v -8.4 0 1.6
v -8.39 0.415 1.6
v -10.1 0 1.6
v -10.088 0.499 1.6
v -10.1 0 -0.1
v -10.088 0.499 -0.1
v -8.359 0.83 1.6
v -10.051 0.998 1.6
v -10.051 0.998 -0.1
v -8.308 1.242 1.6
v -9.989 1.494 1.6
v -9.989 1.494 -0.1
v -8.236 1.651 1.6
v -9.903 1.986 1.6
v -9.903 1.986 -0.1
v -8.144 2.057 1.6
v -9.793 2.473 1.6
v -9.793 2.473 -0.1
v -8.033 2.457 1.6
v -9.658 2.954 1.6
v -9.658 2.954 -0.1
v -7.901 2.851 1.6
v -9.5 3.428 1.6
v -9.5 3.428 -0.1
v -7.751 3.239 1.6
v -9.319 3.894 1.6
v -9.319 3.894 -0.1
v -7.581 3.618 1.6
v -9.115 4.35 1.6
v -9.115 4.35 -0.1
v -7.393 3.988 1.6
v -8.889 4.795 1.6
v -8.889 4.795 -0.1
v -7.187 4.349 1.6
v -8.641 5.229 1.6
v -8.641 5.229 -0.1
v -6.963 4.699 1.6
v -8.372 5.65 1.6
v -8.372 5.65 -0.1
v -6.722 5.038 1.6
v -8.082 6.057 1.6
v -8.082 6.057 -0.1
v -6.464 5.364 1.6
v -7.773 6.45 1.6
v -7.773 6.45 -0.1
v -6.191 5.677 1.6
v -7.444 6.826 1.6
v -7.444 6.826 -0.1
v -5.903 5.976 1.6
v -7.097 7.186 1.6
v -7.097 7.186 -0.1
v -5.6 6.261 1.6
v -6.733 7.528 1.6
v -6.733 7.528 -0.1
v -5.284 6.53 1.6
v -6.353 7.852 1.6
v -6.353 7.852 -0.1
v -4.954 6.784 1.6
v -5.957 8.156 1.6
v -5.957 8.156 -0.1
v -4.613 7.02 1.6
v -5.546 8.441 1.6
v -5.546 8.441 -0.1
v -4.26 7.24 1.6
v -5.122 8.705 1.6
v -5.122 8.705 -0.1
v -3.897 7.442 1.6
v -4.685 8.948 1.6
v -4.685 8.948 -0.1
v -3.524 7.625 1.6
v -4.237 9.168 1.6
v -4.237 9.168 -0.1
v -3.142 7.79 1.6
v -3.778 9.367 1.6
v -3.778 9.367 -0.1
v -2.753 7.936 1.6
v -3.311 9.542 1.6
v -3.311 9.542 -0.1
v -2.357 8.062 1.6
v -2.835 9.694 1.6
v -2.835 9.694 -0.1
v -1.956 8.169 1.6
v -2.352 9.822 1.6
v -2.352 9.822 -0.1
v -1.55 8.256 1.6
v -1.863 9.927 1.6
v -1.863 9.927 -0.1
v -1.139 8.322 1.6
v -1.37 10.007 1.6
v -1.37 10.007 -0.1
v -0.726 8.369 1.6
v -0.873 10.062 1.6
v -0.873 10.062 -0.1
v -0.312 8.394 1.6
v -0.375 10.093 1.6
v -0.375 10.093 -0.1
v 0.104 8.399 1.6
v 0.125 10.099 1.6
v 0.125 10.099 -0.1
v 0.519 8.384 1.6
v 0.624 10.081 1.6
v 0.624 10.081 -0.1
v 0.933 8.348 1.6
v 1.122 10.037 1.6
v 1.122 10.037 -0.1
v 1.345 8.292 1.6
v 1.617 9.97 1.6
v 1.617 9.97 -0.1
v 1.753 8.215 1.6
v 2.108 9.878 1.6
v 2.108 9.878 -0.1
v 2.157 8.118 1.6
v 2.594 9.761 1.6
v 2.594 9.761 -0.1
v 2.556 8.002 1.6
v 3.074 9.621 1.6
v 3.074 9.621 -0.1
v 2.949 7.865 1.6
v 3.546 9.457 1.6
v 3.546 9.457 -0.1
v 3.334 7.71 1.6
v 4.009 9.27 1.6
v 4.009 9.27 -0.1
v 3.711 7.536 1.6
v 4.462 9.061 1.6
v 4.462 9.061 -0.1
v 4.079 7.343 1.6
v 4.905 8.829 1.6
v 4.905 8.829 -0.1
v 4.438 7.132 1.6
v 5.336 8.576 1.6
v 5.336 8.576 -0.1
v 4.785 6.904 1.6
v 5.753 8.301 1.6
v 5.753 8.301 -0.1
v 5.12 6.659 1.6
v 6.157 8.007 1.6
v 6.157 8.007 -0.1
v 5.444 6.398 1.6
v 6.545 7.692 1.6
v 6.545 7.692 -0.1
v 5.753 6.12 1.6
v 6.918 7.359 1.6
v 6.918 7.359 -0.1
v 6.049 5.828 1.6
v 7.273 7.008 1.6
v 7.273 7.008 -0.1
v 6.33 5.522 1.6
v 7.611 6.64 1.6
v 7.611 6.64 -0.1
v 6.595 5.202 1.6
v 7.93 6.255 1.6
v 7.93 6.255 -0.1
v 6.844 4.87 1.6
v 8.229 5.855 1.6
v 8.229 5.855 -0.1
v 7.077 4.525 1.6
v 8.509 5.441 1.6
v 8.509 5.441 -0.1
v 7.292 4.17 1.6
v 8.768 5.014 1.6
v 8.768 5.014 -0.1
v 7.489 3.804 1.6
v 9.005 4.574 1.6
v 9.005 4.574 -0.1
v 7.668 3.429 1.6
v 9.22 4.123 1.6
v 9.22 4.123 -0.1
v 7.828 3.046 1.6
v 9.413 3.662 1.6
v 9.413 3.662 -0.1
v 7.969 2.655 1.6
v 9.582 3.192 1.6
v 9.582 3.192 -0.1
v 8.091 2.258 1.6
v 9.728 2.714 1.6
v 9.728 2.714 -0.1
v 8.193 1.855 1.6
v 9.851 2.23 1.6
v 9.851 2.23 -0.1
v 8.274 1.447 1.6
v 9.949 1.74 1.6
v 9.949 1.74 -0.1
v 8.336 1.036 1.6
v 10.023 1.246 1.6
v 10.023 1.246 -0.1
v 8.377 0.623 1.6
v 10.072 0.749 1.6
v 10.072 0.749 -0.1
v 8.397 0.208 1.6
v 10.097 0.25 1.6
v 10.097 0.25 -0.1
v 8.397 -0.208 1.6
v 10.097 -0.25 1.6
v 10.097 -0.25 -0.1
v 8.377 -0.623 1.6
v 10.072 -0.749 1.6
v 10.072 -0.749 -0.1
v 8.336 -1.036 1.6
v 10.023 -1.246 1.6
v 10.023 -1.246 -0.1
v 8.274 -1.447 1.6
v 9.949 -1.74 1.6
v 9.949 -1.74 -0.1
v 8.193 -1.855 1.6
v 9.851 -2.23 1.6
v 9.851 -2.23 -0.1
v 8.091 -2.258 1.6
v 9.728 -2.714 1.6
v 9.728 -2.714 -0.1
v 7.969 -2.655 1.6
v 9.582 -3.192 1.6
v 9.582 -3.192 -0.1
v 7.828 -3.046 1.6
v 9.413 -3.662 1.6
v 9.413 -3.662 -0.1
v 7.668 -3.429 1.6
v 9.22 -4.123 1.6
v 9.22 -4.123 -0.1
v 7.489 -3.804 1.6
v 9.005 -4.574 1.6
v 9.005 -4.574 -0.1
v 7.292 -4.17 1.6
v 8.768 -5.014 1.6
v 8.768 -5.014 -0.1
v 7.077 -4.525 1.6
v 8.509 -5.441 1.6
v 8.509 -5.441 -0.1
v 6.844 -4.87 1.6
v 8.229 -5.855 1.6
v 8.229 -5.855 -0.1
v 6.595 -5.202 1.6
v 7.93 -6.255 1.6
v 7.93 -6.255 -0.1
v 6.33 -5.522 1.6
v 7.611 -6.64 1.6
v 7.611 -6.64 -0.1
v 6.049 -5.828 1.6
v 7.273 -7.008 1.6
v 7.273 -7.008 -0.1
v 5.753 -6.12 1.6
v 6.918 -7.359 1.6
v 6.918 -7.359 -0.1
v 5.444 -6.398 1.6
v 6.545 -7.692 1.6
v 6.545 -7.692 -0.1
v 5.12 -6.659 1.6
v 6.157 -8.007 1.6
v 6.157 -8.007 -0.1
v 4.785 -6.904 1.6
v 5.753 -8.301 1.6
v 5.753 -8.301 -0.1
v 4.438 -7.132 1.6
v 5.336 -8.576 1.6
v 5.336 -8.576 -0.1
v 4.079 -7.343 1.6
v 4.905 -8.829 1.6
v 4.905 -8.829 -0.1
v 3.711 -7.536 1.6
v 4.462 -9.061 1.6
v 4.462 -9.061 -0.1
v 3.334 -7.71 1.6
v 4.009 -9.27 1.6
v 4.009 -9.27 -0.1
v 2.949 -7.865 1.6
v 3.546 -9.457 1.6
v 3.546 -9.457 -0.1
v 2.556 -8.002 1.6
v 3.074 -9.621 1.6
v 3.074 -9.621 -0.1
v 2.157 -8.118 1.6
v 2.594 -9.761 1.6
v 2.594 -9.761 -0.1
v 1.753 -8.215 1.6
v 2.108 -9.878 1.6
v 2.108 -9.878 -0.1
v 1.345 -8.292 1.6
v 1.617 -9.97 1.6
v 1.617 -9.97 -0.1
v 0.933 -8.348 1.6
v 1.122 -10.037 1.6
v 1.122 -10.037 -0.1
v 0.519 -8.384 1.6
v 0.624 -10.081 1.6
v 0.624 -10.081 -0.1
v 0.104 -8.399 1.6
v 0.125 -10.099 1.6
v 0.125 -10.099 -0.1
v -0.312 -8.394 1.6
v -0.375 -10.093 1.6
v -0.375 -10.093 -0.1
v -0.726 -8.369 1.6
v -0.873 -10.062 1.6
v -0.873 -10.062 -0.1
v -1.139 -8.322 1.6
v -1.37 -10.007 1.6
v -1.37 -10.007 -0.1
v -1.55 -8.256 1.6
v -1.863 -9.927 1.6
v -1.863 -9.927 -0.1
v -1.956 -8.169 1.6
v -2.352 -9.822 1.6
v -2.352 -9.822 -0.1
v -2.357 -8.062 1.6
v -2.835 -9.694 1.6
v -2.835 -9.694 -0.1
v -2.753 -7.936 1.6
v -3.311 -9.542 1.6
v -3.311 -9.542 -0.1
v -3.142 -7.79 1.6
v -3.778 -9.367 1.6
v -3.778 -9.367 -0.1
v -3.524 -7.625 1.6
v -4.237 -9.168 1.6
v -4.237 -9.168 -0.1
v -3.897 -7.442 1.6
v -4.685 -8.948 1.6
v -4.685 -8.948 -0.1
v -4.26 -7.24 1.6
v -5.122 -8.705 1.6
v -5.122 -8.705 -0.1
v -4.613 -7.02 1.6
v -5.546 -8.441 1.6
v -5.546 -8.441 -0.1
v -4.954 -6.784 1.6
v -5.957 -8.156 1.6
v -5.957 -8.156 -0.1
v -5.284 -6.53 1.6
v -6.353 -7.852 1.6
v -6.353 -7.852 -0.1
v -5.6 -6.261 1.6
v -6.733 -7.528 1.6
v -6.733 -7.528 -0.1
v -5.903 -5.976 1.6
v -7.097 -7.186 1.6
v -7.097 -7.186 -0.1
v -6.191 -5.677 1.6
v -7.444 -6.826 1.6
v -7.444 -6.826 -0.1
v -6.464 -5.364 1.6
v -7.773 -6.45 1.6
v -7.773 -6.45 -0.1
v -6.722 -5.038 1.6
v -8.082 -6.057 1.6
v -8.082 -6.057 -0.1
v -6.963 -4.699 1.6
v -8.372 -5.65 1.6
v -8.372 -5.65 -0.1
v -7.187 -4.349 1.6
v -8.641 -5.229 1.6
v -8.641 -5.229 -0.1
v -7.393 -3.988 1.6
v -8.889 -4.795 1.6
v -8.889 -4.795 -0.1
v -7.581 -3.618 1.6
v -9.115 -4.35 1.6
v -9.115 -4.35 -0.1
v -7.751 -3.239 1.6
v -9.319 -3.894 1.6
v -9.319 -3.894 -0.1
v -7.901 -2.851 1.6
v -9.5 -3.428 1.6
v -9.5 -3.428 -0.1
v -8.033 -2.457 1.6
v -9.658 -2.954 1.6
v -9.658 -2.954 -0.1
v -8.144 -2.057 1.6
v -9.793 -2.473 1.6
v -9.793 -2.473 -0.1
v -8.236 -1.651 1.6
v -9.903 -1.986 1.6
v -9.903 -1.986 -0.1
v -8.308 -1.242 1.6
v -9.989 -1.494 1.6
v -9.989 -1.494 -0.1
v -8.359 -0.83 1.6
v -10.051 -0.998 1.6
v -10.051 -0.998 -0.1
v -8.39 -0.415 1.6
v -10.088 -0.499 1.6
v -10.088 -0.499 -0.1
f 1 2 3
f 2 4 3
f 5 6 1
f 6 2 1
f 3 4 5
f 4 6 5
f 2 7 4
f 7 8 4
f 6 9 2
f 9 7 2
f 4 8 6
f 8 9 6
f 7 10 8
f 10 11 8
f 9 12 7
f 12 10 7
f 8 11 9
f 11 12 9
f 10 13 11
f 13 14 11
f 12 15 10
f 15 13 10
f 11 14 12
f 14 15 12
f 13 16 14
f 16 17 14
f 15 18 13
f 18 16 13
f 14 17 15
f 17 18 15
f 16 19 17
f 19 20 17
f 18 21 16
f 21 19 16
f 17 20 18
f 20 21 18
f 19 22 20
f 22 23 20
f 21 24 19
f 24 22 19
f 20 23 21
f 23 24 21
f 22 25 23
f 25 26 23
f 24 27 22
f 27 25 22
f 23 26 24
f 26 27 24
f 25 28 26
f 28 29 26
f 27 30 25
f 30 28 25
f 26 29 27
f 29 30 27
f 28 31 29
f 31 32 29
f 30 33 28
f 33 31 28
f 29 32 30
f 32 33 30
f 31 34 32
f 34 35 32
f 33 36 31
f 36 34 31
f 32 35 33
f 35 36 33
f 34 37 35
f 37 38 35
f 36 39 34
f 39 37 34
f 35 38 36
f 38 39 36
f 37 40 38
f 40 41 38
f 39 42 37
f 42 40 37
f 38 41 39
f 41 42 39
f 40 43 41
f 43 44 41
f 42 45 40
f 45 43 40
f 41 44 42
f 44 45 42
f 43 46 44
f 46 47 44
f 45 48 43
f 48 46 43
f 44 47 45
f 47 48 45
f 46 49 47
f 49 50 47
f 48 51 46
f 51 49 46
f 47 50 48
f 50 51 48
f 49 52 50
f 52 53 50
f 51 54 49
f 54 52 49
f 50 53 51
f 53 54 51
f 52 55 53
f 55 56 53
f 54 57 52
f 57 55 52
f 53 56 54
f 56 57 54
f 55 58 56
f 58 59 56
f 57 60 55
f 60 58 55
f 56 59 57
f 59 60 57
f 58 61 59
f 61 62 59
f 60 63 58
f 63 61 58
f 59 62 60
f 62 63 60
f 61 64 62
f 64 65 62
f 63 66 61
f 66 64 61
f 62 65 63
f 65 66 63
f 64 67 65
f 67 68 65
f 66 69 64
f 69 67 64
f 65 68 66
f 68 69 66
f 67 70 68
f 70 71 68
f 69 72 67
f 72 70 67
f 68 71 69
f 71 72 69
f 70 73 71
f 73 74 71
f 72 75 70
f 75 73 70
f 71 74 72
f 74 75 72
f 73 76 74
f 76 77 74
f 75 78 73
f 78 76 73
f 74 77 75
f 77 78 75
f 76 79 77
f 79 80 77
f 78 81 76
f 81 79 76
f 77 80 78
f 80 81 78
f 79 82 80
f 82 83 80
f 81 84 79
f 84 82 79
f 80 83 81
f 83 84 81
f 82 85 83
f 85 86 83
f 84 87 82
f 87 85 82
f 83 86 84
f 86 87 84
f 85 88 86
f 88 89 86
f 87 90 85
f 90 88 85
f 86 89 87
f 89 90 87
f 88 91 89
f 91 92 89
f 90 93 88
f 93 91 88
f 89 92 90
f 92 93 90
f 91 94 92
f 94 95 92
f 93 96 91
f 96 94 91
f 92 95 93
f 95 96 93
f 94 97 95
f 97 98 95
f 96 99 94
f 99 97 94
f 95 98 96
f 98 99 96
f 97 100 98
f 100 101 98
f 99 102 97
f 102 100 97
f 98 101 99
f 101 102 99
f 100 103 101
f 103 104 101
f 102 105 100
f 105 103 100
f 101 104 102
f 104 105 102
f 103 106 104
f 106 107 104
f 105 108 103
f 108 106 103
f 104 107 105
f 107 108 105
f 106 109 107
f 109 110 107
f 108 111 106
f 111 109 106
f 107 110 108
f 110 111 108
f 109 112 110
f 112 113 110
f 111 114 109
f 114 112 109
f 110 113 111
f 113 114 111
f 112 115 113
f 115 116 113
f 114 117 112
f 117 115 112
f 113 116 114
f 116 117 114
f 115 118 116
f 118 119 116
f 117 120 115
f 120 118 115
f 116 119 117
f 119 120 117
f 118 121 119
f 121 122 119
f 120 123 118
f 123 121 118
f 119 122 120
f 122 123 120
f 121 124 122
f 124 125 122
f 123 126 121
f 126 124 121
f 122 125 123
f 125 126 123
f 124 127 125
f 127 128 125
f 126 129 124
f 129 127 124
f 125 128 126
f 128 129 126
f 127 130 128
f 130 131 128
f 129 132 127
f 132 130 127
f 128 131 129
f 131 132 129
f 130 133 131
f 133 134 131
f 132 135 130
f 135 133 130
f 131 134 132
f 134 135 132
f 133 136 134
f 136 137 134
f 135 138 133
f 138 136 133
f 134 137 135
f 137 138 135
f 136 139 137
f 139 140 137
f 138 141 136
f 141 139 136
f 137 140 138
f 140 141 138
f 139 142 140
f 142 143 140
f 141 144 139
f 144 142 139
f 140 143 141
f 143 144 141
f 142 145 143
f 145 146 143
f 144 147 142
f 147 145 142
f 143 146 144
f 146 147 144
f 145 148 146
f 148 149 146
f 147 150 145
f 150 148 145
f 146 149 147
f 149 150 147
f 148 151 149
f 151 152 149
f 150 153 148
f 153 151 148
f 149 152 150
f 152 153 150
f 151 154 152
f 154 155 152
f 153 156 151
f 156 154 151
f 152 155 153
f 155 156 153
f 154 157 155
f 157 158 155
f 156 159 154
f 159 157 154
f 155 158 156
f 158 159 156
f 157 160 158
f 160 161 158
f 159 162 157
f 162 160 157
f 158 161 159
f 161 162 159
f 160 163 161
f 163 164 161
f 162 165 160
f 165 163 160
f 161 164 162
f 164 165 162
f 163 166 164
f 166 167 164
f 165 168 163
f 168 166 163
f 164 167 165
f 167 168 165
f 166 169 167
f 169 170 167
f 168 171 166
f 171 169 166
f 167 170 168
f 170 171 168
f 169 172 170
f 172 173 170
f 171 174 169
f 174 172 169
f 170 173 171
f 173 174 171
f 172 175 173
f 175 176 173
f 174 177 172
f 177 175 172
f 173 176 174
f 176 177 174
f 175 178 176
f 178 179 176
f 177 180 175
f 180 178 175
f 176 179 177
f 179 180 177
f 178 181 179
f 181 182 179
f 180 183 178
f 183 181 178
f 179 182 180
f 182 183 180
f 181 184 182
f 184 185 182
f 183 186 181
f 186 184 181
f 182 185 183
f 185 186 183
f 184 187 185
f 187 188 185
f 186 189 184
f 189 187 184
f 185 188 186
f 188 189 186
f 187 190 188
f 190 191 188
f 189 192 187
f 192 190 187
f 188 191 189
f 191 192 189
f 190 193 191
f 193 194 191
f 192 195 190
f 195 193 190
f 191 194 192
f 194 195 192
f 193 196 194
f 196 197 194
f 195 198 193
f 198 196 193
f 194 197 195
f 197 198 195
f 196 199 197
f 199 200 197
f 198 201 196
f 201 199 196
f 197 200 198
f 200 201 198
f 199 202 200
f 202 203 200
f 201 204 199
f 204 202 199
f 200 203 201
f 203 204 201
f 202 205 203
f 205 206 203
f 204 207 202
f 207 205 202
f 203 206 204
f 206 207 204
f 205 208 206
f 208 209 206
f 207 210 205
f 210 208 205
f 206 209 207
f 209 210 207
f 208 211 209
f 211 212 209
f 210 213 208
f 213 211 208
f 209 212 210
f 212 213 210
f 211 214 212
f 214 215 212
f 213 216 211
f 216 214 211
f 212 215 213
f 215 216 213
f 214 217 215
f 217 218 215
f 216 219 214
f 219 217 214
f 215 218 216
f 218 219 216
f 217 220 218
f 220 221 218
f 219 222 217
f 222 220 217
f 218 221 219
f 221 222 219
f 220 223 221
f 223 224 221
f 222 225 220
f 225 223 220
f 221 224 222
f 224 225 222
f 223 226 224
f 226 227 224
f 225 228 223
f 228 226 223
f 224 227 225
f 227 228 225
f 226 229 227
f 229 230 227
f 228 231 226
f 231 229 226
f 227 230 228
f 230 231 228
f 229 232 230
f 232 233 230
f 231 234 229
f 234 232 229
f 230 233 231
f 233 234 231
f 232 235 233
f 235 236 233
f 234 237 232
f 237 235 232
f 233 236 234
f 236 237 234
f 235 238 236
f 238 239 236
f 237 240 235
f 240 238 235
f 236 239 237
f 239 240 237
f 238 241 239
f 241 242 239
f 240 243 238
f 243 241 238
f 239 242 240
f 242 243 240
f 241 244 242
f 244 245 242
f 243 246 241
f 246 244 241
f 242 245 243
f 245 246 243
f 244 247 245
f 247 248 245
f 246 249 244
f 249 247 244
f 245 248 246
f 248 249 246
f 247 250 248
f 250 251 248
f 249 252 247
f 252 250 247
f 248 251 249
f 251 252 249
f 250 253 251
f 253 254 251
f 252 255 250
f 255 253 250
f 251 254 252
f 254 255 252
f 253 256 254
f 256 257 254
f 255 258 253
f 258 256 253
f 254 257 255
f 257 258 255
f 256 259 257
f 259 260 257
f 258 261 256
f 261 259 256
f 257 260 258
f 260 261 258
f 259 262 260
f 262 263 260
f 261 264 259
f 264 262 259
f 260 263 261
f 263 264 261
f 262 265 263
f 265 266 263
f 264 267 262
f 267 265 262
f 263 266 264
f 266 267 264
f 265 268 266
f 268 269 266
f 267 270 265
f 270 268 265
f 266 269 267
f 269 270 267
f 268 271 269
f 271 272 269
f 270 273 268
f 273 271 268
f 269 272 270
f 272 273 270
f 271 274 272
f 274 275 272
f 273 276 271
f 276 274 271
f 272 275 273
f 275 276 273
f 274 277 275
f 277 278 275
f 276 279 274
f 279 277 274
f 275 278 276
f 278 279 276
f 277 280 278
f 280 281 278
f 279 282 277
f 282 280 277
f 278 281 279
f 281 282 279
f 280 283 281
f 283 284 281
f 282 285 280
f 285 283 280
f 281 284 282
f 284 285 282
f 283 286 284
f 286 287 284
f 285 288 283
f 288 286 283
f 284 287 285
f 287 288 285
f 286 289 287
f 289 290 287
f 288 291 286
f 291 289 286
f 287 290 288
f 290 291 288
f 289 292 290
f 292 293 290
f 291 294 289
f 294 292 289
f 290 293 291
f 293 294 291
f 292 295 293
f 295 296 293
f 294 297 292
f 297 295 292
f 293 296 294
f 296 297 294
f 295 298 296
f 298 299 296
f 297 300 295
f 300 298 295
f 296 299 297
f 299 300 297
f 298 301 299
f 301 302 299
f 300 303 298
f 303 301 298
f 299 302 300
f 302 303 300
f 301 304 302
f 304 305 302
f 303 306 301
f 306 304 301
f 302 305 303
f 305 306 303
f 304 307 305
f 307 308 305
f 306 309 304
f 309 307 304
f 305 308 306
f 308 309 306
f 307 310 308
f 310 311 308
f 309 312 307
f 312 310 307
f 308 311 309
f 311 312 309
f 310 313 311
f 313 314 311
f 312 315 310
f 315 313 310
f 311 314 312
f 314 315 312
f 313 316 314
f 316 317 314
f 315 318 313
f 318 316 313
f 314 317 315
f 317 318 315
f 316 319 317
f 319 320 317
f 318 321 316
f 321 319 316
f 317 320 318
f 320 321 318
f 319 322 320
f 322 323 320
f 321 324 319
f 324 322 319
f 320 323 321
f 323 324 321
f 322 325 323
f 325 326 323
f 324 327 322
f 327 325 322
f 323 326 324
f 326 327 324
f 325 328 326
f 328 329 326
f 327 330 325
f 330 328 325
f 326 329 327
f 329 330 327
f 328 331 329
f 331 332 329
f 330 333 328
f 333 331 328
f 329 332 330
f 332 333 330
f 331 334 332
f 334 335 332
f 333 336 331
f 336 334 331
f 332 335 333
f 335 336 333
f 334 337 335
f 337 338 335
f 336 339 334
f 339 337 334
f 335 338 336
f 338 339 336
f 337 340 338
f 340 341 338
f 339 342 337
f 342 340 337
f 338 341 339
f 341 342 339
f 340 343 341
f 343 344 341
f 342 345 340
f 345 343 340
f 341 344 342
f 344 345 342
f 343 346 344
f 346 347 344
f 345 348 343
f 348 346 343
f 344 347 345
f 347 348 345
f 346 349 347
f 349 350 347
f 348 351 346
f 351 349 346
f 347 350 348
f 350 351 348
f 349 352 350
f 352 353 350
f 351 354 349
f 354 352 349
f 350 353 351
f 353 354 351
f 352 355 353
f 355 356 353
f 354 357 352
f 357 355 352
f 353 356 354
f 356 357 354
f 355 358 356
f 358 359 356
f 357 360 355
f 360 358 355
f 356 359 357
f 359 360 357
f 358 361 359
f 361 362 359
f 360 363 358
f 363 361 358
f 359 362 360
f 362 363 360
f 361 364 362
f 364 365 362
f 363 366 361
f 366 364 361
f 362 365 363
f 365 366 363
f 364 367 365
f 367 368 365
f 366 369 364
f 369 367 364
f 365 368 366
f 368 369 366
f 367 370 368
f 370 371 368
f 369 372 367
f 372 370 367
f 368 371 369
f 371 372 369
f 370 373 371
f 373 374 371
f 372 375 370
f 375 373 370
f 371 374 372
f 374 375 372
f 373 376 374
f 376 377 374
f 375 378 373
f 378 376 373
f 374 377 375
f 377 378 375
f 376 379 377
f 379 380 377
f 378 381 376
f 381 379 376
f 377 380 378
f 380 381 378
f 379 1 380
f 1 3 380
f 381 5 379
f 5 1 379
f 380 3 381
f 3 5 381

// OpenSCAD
$fa = 1;
$fs = 0.5;

module fillet (r, h, w=0)
{
    w = (w == 0) ? h : w;

    rotate_extrude ()
    translate ([r, 0, 0])
    polygon ([[0, 0], [0, h], [w, 0]]);
}

module fillet_mask (r, h, w=0)
{
    w = (w == 0) ? h : w;

    rotate_extrude ()
    translate ([r-h, 0, 0])
    polygon ([[w + 0.1, h + 0.1], [-0.1, h + 0.1], [w + 0.1, -0.1]]);
}

fillet_mask (r=10, h=1.5);
